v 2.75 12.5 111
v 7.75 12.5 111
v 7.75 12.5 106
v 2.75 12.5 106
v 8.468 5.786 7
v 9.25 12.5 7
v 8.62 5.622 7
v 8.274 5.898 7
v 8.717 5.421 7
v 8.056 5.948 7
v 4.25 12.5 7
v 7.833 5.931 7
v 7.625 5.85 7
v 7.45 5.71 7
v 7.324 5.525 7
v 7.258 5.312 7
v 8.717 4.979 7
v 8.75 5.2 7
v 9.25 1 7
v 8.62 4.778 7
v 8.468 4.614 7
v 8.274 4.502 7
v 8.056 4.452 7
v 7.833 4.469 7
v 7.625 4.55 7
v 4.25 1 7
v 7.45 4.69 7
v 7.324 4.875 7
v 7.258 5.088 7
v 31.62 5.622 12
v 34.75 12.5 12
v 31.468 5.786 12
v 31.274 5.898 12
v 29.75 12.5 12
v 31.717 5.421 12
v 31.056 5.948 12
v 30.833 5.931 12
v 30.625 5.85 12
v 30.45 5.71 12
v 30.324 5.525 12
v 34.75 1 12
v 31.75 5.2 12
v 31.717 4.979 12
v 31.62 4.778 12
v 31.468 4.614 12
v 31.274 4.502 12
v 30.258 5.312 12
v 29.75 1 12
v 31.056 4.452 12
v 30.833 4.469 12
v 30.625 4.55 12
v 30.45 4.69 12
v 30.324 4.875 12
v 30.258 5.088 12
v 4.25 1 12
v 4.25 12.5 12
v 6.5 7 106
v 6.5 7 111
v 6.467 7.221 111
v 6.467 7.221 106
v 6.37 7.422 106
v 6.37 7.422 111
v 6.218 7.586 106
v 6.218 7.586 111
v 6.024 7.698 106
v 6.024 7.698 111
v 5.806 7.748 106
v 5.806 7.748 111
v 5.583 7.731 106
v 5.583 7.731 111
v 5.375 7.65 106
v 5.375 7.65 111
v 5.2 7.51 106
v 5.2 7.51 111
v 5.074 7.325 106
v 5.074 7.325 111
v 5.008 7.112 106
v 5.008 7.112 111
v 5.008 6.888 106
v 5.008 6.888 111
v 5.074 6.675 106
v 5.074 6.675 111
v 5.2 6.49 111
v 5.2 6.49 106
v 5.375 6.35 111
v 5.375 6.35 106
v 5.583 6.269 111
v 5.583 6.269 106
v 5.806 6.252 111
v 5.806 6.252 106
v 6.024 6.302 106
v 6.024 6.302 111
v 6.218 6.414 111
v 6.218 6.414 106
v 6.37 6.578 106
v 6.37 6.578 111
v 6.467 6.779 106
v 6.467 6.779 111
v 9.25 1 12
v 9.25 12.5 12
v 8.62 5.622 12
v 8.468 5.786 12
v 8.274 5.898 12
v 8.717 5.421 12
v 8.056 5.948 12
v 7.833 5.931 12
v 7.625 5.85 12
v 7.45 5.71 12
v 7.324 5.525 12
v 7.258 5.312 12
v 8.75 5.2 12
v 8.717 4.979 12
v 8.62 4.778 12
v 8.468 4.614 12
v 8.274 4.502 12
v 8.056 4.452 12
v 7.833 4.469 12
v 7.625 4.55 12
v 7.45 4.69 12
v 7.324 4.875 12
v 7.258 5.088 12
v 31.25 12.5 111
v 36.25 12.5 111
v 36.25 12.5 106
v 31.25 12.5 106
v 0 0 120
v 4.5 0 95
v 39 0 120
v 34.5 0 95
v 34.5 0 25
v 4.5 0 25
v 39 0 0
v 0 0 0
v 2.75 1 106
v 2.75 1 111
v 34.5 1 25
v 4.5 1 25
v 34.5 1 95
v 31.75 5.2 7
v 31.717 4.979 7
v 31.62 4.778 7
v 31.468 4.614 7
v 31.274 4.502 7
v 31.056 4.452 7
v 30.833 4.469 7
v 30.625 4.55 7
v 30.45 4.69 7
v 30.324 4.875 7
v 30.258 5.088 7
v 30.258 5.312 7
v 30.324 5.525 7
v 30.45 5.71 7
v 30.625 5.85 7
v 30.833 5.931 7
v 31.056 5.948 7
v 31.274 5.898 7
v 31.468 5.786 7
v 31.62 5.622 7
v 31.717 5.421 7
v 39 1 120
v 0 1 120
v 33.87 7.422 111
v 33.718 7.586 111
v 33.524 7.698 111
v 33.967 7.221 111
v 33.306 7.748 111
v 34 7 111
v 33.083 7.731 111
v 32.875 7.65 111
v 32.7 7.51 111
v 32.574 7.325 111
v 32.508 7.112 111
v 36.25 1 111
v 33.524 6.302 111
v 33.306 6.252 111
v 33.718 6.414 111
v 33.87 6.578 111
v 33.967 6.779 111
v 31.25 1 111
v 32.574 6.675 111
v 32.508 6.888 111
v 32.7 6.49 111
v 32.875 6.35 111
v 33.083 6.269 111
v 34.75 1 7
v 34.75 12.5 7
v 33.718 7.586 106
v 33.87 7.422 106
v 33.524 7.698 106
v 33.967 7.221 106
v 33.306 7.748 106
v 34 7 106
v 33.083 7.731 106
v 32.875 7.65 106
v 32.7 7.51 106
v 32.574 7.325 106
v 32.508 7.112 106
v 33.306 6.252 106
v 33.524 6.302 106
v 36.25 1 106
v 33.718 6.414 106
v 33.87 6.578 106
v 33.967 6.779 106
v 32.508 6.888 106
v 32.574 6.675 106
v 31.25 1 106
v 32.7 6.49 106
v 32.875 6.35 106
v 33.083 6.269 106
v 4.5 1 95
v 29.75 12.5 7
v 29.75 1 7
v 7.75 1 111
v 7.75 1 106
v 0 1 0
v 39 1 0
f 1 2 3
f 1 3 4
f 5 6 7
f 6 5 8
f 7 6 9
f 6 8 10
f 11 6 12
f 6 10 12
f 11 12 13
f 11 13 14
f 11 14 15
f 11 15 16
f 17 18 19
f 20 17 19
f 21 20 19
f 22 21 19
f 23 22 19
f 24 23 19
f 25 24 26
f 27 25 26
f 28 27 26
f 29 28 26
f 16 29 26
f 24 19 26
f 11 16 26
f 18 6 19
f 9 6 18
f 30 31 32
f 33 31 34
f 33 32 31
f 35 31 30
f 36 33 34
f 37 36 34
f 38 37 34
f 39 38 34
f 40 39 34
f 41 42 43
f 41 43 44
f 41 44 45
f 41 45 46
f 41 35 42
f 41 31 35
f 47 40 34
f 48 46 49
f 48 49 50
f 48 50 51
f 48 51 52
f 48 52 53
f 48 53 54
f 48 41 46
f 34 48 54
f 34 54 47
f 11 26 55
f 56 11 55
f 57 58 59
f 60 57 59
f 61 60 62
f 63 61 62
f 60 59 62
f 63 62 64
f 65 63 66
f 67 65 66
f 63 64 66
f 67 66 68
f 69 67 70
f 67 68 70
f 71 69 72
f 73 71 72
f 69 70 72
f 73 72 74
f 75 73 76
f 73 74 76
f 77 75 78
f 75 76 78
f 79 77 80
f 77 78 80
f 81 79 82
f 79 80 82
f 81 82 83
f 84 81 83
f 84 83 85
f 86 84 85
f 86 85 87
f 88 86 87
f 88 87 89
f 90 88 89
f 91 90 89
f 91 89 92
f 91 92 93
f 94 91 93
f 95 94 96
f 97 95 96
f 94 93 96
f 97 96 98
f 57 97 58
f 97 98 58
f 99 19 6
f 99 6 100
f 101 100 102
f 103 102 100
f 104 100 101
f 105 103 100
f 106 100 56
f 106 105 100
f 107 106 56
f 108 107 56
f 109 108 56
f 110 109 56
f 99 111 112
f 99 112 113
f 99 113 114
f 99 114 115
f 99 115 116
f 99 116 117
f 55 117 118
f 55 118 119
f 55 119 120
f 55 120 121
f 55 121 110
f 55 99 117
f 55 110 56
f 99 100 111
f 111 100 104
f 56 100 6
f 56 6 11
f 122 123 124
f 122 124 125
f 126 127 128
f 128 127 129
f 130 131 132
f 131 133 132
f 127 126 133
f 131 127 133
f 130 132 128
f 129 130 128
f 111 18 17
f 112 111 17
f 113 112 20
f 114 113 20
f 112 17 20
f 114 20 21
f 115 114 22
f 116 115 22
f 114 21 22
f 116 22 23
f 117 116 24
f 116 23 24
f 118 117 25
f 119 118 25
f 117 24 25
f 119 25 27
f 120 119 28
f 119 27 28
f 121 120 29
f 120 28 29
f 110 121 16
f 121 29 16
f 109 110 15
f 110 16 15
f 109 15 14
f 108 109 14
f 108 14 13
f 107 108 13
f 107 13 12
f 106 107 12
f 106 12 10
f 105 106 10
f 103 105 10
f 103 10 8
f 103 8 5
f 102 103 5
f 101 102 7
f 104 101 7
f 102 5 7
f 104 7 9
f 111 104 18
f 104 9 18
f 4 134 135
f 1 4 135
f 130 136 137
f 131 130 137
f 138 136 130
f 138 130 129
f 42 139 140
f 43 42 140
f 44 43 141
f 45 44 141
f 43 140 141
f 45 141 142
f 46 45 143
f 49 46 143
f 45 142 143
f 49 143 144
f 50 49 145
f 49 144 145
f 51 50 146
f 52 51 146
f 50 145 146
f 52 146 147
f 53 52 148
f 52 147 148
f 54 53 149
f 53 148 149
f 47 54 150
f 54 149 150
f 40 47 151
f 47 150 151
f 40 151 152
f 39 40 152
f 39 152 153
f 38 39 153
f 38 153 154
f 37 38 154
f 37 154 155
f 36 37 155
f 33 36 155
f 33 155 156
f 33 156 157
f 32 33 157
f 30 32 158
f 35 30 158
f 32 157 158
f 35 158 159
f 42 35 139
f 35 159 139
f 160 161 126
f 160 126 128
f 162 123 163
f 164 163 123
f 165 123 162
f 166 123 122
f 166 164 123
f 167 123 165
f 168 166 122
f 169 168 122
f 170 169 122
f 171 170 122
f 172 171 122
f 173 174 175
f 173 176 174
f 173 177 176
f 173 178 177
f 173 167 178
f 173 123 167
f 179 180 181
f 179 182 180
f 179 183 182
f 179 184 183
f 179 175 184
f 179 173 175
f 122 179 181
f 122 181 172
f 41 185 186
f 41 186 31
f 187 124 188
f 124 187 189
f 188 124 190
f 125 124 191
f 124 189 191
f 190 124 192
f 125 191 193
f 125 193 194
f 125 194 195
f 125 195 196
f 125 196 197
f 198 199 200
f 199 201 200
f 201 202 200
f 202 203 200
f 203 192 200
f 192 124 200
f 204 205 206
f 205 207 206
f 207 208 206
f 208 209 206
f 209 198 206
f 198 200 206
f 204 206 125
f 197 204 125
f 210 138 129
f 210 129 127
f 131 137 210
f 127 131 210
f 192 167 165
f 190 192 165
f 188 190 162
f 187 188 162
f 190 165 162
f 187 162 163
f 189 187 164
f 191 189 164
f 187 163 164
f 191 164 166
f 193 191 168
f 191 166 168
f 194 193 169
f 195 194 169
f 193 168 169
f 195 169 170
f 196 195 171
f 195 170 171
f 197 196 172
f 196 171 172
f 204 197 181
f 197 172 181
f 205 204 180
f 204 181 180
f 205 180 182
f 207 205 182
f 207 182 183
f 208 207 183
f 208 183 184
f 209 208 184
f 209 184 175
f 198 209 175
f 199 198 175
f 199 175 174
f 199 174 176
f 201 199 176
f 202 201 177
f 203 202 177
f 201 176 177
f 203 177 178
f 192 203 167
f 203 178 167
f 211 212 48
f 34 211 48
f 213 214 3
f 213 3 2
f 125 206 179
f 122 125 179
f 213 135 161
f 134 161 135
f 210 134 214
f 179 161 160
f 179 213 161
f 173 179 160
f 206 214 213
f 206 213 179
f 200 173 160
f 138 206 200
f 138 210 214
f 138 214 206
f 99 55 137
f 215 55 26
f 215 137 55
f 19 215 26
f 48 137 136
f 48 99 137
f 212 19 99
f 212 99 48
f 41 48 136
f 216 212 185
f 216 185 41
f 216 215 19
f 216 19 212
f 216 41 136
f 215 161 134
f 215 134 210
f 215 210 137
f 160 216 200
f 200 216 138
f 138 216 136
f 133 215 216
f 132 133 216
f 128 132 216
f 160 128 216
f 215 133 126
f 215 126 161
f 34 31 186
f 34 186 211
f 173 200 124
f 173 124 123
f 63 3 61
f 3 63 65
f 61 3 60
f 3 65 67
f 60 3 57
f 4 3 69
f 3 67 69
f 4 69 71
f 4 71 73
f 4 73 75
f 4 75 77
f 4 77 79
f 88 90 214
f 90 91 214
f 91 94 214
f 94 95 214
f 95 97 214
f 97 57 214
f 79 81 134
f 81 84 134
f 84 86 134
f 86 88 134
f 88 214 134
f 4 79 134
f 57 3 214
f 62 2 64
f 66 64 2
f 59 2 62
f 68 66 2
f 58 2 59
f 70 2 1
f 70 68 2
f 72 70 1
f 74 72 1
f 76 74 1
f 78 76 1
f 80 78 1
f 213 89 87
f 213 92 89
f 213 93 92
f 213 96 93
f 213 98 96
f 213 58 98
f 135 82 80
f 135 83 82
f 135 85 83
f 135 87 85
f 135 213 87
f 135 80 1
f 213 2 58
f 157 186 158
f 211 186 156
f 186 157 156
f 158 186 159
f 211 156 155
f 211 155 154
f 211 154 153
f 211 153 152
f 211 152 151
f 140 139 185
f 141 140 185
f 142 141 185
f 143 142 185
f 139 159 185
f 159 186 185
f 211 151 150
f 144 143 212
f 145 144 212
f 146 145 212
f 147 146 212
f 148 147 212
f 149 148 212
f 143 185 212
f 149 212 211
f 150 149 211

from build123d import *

# Parameters (mm, degrees)
SKETCH_W        = 39
SKETCH_H        = 1
PAD_DEPTH       = 120
SKETCH001_W     = 5
SKETCH001_H     = 5
PAD001_DEPTH    = 11.5
SKETCH003_R     = 0.75
POCKET_DEPTH    = 5
SKETCH002_R     = 0.75
POCKET001_DEPTH = 5
SKETCH004_W     = 30
SKETCH004_H     = 70
POCKET002_DEPTH = 5


with BuildPart() as part:
    # Sketch → Pad (new body)
    with BuildSketch(Plane.XY):
        with Locations((19.5, 0.5)):
            Rectangle(SKETCH_W, SKETCH_H)
    extrude(amount=PAD_DEPTH)

    # Sketch001 → Pad001 (new body)
    with BuildSketch(Plane(origin=(0, 1, 0), x_dir=(-1, 0, 0), z_dir=(0, 1, 0))):
        with Locations((-33.75, 108.5)):
            Rectangle(SKETCH001_W, SKETCH001_H)
        with Locations((-5.25, 108.5)):
            Rectangle(SKETCH001_W, SKETCH001_H)
        with Locations((-32.25, 9.5)):
            Rectangle(SKETCH001_W, SKETCH001_H)
        with Locations((-6.75, 9.5)):
            Rectangle(SKETCH001_W, SKETCH001_H)
    extrude(amount=PAD001_DEPTH)

    # Sketch003 → Pocket (cut)
    with BuildSketch(Plane.XY.offset(111)):
        with Locations((5.75, 7)):
            Circle(SKETCH003_R)
        with Locations((33.25, 7)):
            Circle(SKETCH003_R)
    extrude(amount=-POCKET_DEPTH, mode=Mode.SUBTRACT)

    # Sketch002 → Pocket001 (cut)
    with BuildSketch(Plane(origin=(0, 0, 7), x_dir=(1, 0, 0), z_dir=(0, 0, -1))):
        with Locations((31, -5.2)):
            Circle(SKETCH002_R)
        with Locations((8, -5.2)):
            Circle(SKETCH002_R)
    extrude(amount=-POCKET001_DEPTH, mode=Mode.SUBTRACT)

    # Sketch004 → Pocket002 (cut)
    with BuildSketch(Plane(origin=(0, 1, 0), x_dir=(-1, 0, 0), z_dir=(0, 1, 0))):
        with Locations((-19.5, 60)):
            Rectangle(SKETCH004_W, SKETCH004_H)
    extrude(amount=-POCKET002_DEPTH, mode=Mode.SUBTRACT)


solid = part.part
